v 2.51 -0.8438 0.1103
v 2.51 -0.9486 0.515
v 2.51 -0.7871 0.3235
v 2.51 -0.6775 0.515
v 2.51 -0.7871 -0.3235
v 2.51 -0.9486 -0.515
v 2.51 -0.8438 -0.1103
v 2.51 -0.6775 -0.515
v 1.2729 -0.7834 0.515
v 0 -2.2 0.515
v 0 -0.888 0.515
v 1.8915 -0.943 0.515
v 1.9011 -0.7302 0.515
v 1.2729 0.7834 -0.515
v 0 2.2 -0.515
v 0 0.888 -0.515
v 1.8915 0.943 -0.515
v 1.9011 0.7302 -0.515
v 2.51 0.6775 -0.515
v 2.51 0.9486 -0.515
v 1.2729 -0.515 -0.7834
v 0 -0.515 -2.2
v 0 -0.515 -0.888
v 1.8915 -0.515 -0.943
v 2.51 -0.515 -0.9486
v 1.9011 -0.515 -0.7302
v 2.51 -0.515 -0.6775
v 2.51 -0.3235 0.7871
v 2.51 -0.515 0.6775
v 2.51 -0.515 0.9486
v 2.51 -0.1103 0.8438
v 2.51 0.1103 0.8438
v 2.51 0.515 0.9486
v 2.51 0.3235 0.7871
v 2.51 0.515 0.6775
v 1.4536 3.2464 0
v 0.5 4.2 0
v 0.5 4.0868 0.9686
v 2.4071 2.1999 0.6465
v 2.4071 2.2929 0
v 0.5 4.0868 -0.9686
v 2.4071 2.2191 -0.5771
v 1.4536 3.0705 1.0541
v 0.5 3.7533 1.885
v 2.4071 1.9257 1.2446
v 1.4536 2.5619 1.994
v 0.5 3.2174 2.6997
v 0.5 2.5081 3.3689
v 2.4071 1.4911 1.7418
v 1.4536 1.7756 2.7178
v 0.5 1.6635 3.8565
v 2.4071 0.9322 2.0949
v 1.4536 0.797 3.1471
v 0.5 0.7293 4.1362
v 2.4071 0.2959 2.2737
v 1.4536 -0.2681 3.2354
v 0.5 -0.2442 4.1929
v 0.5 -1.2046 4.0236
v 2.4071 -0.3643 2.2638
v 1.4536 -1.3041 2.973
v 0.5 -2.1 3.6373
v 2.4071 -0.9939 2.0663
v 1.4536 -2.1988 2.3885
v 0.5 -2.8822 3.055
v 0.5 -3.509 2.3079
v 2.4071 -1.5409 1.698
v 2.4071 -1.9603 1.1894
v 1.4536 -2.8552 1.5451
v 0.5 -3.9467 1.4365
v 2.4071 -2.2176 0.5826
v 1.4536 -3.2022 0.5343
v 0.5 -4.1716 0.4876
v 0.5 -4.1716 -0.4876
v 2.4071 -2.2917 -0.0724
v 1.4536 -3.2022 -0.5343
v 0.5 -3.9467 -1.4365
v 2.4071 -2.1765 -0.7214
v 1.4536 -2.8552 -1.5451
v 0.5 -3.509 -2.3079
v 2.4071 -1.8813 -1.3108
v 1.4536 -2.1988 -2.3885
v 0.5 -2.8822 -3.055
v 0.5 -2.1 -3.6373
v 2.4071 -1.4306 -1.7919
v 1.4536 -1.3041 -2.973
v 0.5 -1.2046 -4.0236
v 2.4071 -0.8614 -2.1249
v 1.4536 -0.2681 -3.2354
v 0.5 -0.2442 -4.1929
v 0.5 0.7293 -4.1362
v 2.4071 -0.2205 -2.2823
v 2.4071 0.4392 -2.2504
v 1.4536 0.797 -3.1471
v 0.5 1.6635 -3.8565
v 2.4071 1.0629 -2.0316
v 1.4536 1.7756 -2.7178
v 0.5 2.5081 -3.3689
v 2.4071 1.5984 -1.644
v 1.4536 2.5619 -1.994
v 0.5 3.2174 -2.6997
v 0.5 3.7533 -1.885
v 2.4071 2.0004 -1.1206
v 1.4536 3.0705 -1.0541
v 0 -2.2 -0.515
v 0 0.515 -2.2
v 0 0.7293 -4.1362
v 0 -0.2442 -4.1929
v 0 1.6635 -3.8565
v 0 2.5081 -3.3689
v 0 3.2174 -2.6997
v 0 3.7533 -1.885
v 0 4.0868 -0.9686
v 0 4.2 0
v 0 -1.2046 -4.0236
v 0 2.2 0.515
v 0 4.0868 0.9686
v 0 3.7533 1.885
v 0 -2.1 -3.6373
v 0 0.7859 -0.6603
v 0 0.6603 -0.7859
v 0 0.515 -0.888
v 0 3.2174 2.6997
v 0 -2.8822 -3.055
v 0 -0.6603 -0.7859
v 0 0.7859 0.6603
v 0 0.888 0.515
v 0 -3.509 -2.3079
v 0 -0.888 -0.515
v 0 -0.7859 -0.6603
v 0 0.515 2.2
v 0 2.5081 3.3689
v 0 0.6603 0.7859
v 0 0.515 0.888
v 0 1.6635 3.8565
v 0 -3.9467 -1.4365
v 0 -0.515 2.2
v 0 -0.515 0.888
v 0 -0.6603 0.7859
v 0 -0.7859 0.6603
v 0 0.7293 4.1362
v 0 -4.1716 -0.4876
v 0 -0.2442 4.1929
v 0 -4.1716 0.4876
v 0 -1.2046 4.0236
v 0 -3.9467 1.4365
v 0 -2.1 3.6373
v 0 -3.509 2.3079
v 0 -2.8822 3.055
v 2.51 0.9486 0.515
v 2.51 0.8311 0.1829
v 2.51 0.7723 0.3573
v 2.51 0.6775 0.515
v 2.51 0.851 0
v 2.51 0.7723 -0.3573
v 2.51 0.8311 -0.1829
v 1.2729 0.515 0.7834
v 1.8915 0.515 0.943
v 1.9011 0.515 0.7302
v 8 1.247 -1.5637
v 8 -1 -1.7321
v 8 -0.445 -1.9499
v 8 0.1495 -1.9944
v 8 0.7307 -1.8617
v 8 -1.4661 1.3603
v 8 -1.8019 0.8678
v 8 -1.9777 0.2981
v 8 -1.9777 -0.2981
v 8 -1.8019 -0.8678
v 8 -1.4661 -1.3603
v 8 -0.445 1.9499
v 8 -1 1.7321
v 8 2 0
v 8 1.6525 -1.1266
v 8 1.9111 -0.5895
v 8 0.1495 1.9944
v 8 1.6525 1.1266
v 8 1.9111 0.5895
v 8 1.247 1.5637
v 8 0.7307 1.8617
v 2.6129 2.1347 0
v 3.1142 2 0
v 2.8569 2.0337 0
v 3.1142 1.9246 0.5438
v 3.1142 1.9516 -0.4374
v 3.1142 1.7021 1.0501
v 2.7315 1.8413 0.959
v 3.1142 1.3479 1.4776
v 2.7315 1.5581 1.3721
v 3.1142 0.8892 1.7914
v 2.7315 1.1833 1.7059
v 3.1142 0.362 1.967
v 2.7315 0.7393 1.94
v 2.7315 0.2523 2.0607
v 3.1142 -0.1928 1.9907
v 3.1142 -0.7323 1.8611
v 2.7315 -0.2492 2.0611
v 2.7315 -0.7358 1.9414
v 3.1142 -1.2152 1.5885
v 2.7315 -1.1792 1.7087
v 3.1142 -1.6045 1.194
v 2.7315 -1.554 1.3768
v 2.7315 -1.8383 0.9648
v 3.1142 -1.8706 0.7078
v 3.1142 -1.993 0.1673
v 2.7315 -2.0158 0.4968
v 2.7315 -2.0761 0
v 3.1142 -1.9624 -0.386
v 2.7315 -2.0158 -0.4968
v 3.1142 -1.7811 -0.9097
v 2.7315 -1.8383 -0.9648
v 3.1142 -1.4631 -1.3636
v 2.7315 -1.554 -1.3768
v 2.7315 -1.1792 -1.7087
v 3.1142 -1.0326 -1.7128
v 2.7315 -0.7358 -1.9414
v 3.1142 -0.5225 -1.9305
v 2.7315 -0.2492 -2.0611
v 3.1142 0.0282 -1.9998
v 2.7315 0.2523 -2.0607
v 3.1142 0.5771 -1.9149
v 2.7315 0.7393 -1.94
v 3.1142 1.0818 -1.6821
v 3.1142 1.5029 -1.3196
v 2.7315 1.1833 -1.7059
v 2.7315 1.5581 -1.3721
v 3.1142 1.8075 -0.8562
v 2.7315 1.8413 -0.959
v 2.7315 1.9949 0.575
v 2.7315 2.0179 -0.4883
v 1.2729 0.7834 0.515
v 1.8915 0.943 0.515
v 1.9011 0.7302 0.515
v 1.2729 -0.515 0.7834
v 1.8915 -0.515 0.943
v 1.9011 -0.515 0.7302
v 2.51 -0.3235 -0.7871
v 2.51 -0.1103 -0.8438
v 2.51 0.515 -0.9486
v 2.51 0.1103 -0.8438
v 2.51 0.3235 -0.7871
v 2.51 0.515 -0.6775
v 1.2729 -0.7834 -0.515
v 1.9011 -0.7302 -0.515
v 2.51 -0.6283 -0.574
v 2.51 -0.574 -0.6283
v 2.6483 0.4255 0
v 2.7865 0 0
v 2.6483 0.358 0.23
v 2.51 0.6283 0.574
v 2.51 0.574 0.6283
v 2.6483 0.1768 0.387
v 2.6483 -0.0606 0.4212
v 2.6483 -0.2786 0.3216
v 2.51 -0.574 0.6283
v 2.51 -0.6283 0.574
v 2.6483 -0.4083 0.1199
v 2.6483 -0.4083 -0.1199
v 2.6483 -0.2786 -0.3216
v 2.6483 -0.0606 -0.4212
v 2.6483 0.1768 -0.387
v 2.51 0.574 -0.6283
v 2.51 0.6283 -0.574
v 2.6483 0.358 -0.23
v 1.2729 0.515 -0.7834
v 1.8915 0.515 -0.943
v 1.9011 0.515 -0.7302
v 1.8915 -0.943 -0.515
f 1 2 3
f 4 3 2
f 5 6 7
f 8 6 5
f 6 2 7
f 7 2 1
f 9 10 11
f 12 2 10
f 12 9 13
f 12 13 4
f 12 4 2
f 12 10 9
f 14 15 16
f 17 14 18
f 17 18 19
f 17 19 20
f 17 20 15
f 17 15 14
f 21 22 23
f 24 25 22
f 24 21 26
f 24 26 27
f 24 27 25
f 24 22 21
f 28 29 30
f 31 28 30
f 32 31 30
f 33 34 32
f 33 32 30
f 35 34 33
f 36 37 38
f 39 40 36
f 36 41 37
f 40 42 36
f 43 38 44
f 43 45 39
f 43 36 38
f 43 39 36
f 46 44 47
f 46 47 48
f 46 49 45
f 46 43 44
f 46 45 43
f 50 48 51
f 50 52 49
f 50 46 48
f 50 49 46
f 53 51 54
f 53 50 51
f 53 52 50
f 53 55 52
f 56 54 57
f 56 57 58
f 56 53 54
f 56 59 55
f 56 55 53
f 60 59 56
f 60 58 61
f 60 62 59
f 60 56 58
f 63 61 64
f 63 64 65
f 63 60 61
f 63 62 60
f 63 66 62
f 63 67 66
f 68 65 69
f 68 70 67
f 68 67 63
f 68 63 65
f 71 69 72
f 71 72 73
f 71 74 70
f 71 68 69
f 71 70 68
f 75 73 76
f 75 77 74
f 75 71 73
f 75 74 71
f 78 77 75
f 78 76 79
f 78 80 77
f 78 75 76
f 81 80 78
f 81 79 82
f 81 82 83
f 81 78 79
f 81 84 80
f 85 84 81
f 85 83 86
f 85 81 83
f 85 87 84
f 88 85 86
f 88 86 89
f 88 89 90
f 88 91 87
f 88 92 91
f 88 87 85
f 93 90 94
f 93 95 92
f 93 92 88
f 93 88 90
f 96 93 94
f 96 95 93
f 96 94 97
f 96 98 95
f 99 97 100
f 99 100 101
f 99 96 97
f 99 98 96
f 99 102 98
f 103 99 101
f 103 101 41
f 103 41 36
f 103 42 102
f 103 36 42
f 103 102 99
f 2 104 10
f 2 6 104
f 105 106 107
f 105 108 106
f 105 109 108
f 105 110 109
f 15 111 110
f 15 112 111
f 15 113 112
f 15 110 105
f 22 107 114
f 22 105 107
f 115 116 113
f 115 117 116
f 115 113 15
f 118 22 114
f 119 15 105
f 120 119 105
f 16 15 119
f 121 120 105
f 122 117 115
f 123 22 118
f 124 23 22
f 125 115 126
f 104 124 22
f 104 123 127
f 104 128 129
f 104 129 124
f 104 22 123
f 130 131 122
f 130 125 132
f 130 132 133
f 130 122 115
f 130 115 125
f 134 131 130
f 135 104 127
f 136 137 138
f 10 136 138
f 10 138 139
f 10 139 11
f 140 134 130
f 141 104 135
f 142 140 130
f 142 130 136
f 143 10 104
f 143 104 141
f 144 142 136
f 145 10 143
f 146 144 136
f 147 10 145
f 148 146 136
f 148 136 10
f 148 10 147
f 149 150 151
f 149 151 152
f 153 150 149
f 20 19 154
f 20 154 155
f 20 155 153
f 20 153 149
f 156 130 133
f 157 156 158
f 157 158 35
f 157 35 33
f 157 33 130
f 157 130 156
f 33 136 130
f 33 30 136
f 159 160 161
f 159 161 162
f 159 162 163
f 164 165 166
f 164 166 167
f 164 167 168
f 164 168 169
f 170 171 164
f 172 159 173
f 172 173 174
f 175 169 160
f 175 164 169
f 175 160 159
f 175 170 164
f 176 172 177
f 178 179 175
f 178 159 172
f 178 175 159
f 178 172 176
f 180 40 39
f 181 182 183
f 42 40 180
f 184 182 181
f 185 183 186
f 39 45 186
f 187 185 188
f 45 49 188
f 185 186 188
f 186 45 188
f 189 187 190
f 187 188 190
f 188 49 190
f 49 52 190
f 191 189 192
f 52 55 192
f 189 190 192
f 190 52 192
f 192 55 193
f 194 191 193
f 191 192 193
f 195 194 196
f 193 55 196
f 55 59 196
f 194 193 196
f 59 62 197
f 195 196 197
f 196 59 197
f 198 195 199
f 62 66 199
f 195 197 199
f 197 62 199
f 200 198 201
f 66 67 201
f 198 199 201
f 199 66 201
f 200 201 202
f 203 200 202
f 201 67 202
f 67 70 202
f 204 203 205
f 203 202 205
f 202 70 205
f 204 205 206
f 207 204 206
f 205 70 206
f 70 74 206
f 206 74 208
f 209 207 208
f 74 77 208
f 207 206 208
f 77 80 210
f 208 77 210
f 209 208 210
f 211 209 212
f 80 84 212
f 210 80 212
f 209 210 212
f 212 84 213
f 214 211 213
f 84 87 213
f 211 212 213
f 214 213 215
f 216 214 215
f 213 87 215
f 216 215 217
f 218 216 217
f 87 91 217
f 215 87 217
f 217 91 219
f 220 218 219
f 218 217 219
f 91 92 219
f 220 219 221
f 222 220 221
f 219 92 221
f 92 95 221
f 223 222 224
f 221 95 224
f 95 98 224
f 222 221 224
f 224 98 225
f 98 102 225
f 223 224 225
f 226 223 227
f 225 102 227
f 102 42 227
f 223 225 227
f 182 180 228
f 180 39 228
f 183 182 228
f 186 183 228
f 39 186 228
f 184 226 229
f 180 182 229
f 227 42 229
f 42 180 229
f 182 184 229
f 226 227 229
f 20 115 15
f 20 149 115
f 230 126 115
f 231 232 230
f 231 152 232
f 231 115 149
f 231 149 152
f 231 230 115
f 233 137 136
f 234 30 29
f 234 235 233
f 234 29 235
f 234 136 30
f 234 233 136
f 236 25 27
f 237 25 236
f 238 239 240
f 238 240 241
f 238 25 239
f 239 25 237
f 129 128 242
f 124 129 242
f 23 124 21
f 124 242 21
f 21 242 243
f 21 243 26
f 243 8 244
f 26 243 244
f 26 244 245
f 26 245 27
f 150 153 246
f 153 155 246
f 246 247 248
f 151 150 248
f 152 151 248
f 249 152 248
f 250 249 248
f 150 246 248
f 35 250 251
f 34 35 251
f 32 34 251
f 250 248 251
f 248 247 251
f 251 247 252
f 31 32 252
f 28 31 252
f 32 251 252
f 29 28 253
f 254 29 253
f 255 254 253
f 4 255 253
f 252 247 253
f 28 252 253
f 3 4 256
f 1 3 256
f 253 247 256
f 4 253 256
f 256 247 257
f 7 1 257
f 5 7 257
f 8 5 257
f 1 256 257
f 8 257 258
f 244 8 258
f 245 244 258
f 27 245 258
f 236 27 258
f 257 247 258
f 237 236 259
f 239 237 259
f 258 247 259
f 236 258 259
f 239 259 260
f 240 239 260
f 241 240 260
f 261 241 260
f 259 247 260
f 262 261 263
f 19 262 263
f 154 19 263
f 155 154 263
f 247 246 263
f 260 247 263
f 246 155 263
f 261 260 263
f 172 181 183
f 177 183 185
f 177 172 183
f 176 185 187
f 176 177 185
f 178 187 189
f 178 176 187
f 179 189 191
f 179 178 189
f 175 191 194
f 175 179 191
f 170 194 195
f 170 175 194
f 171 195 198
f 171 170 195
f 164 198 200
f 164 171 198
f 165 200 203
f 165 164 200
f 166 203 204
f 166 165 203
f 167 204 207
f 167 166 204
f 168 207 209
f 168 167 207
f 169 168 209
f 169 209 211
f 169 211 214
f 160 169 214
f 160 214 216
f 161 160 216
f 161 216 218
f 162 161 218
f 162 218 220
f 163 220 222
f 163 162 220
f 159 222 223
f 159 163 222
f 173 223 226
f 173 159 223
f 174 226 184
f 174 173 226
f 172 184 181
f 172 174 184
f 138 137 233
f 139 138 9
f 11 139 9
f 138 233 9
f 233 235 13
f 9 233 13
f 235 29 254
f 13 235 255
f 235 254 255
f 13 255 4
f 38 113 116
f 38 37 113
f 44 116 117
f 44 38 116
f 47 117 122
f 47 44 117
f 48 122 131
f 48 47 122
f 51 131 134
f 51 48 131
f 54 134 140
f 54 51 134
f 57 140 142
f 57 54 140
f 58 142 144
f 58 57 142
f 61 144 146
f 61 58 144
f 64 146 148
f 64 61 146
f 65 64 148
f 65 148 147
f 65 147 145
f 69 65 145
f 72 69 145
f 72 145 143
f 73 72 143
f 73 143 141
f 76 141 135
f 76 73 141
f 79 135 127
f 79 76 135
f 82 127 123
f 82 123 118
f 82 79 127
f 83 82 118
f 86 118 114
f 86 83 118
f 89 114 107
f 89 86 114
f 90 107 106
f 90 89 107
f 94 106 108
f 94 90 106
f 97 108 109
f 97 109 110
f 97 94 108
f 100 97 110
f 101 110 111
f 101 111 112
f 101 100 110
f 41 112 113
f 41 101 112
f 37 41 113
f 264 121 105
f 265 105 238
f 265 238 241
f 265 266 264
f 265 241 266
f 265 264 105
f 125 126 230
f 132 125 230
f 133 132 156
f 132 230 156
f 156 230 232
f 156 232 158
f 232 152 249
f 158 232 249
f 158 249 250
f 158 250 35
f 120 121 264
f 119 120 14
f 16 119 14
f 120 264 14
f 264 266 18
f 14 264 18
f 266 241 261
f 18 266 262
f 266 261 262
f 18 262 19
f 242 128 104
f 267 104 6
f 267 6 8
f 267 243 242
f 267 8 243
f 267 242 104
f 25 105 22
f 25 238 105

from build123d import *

# Parameters (mm, degrees)
FILLET1_R    = 1
SKETCH3_W    = 1.03
SKETCH3_H    = 4.4
SKETCH4_W    = 1.03
SKETCH4_H    = 1.897120746
RECPAT_COUNT = 2
RECPAT_ANGLE = 90


with BuildPart() as part:
    # BodySke → Base-Revolve (revolve)
    with BuildSketch(Plane.XY):
        Polygon((0, 0), (0, 4.2), (0.5, 4.2), (2.7, 2), (8, 2), (8, 0), align=None)
    revolve(axis=Axis((-6.35, 0, 0), (1, 0, 0)))

    # Fillet1
    fillet1_edges = [part.edges().sort_by_distance(p)[0] for p in [
        (2.7, -2, 0),
    ]]
    fillet(fillet1_edges, radius=FILLET1_R)

    # Sketch3 → Recess section 0
    with BuildSketch(Plane.ZY):
        Rectangle(SKETCH3_W, SKETCH3_H)
    # Sketch4 → Recess section 1
    with BuildSketch(Plane.ZY.offset(-2.51)):
        Rectangle(SKETCH4_W, SKETCH4_H)
    recess = loft(mode=Mode.SUBTRACT)

    # RecPat: Recess ×2 about axis
    recpat_axis = Axis((0, 0, 0), (1, 0, 0))
    for i in range(1, RECPAT_COUNT):
        add(recess.rotate(recpat_axis, i * RECPAT_ANGLE / (RECPAT_COUNT - 1)), mode=Mode.SUBTRACT)

    # RecCorSke → RecessCore (revolve, cut)
    with BuildSketch(Plane.XY):
        Polygon((0, 0), (0, 1.026516298), (2.51, 0.851), (2.786506661, 0), align=None)
    revolve(axis=Axis((-3.175, 0, 0), (1, 0, 0)), mode=Mode.SUBTRACT)


solid = part.part
